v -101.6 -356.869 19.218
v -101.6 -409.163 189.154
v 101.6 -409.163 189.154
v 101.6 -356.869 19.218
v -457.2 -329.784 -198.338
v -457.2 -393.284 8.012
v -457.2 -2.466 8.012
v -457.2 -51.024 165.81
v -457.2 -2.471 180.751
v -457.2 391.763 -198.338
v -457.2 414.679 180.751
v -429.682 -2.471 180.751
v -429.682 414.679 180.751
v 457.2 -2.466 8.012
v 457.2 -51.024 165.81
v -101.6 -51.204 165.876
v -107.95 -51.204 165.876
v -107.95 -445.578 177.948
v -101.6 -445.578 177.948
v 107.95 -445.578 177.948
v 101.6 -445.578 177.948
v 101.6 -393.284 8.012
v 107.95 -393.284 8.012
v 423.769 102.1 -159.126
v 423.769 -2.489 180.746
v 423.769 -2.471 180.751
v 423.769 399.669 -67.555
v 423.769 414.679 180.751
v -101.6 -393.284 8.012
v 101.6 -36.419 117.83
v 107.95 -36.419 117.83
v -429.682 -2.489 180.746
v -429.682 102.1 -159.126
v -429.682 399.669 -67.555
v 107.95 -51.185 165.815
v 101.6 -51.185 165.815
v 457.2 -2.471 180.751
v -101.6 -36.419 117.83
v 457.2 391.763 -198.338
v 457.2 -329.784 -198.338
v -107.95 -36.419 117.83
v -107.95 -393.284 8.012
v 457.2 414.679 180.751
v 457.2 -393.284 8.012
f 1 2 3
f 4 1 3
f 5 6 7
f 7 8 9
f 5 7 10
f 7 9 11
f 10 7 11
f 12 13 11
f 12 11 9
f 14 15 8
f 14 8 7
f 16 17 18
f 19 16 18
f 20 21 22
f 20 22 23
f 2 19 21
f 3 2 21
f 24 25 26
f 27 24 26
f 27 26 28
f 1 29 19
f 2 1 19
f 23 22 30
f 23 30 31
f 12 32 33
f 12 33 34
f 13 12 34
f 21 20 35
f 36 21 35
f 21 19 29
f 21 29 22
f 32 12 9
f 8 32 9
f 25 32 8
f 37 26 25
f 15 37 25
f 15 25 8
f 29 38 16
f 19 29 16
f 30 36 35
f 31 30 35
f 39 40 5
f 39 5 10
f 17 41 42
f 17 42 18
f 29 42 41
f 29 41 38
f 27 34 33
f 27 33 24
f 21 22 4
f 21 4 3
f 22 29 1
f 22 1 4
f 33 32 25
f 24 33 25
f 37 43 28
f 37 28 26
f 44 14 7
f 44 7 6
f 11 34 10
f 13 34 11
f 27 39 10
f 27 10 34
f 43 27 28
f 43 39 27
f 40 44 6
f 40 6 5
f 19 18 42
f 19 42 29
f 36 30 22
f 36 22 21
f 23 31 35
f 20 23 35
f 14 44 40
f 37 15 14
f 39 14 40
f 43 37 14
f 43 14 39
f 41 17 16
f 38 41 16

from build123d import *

# Parameters (mm, degrees)
F1_DEPTH  = 457.2
F3_W      = 853.4504771233
F3_H      = 418.8702180982
F4_DEPTH  = 355.6
F5_W      = 203.2
F5_H      = 177.8
F6_DEPTH  = 38.1
F5_W_2    = 6.35
F9_DEPTH  = 373.38
F11_DEPTH = 6.35
F13_DEPTH = 6.35


with BuildPart() as f1:
    # F0 (on Right) → F1 (new body, symmetric)
    with BuildSketch(Plane.YZ):
        Polygon((-2.4713186666, 180.750835103), (-51.0243952496, 165.8096586324), (-2.4655717202, 8.0121597376), (61.0344282798, -198.3384157401), (114.1853340847, -198.3384157401), align=None)
        Polygon((61.0344282798, -198.3384157401), (-2.4655717202, 8.0121597376), (-393.2840364218, 8.0121597376), (-329.7840364218, -198.3384157401), align=None)
        Polygon((414.6792432185, 180.750835103), (-2.4713186666, 180.750835103), (114.1853340847, -198.3384157401), (391.763212096, -198.3384157401), align=None)
    extrude(amount=F1_DEPTH, both=True)

    # F3 (on offset) → F4 (cut)
    with BuildSketch(Plane(origin=(0, -51.0243952496, 165.8096586324), x_dir=(1, 0, 0), z_dir=(0, -0.2941176471, 0.9557692241))):
        with Locations((-2.9565989971, 260.2170370519)):
            Rectangle(F3_W, F3_H)
    extrude(amount=-F4_DEPTH, mode=Mode.SUBTRACT)


with BuildPart() as f6:
    # F5 (on face) → F6 (new body)
    with BuildSketch(Plane(origin=(0, -357.0106390354, -109.8624296359), x_dir=(1, 0, 0), z_dir=(0, -0.9557692241, -0.2941176471))):
        with Locations((0, 212.2295511138)):
            Rectangle(F5_W, F5_H)
    extrude(amount=-F6_DEPTH)


with BuildPart() as f9:
    # F5 (on face) → F9 (new body)
    with BuildSketch(Plane(origin=(0, -357.0106390354, -109.8624296359), x_dir=(1, 0, 0), z_dir=(0, -0.9557692241, -0.2941176471))):
        with Locations((104.775, 212.2295511138)):
            Rectangle(F5_W_2, F5_H)
    extrude(amount=-F9_DEPTH)

    # F10 (on face) → F11 (cut)
    with BuildSketch(Plane.YZ.offset(107.95)):
        Polygon((-51.1852493659, 165.8146860492), (-51.0262735188, 165.8097952604), (-88.7130411838, 287.7655748369), align=None)
        Polygon((-445.5781540689, 177.9479277781), (-51.1852493659, 165.8146860492), (-88.7130411838, 287.7655748369), align=None)
    extrude(amount=-F11_DEPTH, mode=Mode.SUBTRACT)


with BuildPart() as f9b:
    # F5 (on face) → F9, piece 2 (new body)
    with BuildSketch(Plane(origin=(0, -357.0106390354, -109.8624296359), x_dir=(1, 0, 0), z_dir=(0, -0.9557692241, -0.2941176471))):
        with Locations((-104.775, 212.2295511138)):
            Rectangle(F5_W_2, F5_H)
    extrude(amount=-F9_DEPTH)

    # F12 (on face) → F13 (cut)
    with BuildSketch(Plane(origin=(-107.95, 0, 0), x_dir=(0, -1, 0), z_dir=(-1, 0, 0))):
        Polygon((88.7130411838, 287.7655748369), (51.2041607247, 165.8761406911), (445.5781540689, 177.9479277781), align=None)
    extrude(amount=-F13_DEPTH, mode=Mode.SUBTRACT)


solid = Compound([f1.part, f6.part, f9.part, f9b.part])
